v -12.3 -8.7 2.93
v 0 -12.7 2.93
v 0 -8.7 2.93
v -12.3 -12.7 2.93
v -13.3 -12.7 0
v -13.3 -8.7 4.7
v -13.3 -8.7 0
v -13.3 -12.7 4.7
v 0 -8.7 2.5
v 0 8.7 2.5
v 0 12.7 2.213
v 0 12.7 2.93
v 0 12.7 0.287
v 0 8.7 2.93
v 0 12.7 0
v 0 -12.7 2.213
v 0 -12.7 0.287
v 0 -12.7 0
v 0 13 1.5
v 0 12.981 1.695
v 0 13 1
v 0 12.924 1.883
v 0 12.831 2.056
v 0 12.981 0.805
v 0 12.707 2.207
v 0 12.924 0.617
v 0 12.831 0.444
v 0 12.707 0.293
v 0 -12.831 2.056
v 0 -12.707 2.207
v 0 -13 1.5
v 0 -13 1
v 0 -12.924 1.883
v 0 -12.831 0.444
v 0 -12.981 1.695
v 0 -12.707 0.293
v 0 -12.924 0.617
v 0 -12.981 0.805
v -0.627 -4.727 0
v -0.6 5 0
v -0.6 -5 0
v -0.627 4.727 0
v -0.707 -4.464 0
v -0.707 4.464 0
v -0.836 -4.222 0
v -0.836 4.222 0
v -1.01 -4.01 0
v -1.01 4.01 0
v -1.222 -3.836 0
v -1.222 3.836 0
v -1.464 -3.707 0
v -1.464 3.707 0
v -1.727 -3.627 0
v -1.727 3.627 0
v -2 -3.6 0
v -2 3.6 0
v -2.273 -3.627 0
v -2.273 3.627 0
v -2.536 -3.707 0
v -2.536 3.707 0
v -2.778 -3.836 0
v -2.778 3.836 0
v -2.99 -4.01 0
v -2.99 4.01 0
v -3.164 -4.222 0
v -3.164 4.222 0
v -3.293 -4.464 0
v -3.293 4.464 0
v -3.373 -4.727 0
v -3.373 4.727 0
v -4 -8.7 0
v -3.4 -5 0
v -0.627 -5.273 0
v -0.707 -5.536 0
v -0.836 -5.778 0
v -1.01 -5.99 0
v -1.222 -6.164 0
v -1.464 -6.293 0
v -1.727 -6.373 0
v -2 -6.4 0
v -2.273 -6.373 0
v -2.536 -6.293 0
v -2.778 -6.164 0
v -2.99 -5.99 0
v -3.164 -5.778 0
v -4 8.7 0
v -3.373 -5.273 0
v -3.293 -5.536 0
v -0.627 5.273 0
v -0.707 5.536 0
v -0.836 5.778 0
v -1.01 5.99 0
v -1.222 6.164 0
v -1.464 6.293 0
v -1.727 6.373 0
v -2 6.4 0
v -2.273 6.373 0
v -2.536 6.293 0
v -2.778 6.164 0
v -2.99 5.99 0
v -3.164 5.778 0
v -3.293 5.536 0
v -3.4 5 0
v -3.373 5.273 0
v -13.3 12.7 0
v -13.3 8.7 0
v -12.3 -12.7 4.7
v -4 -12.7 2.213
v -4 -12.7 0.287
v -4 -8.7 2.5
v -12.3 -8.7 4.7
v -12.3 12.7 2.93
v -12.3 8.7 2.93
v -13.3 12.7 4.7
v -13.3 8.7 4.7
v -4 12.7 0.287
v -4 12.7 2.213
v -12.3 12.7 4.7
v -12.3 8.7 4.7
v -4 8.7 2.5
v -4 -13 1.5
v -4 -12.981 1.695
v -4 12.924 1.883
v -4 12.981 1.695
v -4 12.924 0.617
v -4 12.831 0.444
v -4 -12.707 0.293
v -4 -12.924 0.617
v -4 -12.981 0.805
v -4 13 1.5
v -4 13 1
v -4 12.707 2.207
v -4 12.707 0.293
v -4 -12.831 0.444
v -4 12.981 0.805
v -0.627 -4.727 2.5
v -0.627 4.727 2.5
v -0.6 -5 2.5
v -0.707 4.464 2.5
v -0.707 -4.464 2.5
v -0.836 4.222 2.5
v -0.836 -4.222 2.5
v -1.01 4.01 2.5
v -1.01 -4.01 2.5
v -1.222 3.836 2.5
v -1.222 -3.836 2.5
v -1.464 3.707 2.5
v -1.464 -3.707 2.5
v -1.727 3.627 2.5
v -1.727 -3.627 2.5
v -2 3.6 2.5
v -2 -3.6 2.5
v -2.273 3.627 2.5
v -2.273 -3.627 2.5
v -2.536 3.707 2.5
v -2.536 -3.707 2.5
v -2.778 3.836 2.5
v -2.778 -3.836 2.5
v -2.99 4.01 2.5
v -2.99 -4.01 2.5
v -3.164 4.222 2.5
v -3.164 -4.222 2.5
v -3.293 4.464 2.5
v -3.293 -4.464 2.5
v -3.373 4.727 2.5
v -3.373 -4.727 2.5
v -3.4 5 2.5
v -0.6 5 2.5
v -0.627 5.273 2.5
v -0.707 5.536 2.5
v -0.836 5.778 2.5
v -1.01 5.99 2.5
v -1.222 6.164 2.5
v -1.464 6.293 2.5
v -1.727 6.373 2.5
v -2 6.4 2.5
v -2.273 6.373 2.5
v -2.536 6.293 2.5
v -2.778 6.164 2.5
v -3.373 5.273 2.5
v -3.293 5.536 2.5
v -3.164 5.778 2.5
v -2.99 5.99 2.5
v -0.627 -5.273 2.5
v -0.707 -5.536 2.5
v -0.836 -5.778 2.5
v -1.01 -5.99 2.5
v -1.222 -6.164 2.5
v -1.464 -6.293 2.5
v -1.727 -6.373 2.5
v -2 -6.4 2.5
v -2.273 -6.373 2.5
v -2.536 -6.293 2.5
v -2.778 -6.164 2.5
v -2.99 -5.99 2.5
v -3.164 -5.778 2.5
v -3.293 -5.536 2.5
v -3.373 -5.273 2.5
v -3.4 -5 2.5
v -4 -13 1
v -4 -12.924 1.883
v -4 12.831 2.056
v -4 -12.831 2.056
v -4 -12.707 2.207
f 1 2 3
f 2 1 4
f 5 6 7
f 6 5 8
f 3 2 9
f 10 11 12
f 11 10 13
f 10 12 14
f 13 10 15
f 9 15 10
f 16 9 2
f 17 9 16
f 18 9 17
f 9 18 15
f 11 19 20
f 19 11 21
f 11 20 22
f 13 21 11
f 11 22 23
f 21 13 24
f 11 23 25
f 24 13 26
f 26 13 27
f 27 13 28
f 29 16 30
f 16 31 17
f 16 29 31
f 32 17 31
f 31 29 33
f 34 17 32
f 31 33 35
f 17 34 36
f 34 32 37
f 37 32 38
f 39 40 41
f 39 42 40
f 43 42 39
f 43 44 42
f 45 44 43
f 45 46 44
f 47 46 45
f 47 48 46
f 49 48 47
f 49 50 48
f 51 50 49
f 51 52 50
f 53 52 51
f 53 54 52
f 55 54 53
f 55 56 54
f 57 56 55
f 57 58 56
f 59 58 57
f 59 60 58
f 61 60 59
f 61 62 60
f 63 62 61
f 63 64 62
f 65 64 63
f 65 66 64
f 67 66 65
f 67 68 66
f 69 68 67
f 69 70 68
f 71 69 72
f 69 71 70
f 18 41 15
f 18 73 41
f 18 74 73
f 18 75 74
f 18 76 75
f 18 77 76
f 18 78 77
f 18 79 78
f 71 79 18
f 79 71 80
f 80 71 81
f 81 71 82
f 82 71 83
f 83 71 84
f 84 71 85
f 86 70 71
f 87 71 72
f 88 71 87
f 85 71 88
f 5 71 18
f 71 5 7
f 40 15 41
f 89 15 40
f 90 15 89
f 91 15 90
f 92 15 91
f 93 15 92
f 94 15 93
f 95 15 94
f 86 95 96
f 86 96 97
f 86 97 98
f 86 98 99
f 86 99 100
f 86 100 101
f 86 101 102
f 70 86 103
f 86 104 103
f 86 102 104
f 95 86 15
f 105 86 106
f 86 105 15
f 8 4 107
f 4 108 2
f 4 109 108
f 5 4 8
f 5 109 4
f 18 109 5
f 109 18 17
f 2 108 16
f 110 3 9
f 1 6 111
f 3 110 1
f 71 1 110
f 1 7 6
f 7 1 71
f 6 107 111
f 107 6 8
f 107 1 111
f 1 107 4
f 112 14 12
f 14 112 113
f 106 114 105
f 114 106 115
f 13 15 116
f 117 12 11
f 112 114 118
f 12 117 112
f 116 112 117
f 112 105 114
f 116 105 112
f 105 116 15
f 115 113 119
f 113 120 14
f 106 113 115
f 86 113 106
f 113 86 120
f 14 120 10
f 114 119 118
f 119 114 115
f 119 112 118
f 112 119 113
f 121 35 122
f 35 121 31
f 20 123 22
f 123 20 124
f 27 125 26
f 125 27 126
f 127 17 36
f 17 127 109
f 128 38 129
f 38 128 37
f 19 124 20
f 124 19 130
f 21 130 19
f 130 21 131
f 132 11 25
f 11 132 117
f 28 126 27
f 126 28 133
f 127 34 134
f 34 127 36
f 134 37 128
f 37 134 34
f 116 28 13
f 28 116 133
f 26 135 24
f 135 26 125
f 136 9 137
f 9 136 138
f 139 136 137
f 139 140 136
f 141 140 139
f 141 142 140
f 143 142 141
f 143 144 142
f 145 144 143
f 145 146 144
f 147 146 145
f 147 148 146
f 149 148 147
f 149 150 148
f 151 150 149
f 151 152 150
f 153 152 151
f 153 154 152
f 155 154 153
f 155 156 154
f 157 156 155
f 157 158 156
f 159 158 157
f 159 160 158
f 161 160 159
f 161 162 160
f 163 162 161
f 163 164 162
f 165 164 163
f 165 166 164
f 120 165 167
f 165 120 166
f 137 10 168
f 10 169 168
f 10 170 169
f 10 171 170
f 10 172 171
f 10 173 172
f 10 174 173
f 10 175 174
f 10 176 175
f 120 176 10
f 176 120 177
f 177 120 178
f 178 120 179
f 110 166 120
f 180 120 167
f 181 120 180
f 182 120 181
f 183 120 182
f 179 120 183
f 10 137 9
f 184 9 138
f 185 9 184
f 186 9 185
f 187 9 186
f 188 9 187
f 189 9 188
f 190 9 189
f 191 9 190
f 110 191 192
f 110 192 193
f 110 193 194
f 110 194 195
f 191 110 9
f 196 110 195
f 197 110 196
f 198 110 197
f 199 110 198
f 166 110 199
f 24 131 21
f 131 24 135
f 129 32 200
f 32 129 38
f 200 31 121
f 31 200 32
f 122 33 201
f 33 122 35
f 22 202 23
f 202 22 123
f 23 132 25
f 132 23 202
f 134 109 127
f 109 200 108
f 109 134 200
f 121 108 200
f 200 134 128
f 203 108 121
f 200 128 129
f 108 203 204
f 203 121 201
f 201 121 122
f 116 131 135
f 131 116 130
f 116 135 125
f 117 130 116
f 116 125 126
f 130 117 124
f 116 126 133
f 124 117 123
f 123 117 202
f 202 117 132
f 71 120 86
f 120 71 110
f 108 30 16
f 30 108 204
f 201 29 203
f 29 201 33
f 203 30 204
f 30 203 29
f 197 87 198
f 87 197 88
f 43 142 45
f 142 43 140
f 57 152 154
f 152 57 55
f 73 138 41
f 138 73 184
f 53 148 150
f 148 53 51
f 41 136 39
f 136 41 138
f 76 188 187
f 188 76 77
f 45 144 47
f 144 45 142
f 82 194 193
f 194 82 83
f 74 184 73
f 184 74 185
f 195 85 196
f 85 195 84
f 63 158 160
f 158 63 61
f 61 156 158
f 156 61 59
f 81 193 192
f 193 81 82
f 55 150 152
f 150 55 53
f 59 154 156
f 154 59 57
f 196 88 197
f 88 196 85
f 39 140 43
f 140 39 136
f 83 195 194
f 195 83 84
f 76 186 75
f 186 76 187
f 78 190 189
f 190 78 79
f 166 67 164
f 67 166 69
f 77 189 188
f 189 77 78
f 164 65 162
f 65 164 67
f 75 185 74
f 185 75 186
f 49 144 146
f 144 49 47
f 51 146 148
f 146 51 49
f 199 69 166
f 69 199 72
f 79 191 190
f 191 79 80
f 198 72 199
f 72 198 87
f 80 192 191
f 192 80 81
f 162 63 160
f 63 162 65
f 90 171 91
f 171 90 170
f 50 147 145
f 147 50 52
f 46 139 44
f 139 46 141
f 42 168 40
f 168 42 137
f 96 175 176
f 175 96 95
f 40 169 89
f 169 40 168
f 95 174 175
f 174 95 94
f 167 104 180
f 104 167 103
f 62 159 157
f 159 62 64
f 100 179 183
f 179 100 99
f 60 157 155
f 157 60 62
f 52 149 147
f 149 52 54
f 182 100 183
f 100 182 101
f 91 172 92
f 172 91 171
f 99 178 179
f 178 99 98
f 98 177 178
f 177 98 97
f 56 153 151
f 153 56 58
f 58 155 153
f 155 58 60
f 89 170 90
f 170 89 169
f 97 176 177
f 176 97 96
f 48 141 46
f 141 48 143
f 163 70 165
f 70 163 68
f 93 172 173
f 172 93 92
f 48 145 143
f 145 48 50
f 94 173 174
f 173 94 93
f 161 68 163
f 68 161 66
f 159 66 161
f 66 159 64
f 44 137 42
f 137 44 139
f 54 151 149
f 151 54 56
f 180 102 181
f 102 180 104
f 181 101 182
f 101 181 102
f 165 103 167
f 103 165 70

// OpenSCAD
include <../lib/robotskin.scad>
translate([0,0,RM_ESP32_S3_DEVKITC_BODY_SIZE[0]/2+2.5])
  rotate([0,-90,0]) esp32_s3_devkitc_end_cap();
